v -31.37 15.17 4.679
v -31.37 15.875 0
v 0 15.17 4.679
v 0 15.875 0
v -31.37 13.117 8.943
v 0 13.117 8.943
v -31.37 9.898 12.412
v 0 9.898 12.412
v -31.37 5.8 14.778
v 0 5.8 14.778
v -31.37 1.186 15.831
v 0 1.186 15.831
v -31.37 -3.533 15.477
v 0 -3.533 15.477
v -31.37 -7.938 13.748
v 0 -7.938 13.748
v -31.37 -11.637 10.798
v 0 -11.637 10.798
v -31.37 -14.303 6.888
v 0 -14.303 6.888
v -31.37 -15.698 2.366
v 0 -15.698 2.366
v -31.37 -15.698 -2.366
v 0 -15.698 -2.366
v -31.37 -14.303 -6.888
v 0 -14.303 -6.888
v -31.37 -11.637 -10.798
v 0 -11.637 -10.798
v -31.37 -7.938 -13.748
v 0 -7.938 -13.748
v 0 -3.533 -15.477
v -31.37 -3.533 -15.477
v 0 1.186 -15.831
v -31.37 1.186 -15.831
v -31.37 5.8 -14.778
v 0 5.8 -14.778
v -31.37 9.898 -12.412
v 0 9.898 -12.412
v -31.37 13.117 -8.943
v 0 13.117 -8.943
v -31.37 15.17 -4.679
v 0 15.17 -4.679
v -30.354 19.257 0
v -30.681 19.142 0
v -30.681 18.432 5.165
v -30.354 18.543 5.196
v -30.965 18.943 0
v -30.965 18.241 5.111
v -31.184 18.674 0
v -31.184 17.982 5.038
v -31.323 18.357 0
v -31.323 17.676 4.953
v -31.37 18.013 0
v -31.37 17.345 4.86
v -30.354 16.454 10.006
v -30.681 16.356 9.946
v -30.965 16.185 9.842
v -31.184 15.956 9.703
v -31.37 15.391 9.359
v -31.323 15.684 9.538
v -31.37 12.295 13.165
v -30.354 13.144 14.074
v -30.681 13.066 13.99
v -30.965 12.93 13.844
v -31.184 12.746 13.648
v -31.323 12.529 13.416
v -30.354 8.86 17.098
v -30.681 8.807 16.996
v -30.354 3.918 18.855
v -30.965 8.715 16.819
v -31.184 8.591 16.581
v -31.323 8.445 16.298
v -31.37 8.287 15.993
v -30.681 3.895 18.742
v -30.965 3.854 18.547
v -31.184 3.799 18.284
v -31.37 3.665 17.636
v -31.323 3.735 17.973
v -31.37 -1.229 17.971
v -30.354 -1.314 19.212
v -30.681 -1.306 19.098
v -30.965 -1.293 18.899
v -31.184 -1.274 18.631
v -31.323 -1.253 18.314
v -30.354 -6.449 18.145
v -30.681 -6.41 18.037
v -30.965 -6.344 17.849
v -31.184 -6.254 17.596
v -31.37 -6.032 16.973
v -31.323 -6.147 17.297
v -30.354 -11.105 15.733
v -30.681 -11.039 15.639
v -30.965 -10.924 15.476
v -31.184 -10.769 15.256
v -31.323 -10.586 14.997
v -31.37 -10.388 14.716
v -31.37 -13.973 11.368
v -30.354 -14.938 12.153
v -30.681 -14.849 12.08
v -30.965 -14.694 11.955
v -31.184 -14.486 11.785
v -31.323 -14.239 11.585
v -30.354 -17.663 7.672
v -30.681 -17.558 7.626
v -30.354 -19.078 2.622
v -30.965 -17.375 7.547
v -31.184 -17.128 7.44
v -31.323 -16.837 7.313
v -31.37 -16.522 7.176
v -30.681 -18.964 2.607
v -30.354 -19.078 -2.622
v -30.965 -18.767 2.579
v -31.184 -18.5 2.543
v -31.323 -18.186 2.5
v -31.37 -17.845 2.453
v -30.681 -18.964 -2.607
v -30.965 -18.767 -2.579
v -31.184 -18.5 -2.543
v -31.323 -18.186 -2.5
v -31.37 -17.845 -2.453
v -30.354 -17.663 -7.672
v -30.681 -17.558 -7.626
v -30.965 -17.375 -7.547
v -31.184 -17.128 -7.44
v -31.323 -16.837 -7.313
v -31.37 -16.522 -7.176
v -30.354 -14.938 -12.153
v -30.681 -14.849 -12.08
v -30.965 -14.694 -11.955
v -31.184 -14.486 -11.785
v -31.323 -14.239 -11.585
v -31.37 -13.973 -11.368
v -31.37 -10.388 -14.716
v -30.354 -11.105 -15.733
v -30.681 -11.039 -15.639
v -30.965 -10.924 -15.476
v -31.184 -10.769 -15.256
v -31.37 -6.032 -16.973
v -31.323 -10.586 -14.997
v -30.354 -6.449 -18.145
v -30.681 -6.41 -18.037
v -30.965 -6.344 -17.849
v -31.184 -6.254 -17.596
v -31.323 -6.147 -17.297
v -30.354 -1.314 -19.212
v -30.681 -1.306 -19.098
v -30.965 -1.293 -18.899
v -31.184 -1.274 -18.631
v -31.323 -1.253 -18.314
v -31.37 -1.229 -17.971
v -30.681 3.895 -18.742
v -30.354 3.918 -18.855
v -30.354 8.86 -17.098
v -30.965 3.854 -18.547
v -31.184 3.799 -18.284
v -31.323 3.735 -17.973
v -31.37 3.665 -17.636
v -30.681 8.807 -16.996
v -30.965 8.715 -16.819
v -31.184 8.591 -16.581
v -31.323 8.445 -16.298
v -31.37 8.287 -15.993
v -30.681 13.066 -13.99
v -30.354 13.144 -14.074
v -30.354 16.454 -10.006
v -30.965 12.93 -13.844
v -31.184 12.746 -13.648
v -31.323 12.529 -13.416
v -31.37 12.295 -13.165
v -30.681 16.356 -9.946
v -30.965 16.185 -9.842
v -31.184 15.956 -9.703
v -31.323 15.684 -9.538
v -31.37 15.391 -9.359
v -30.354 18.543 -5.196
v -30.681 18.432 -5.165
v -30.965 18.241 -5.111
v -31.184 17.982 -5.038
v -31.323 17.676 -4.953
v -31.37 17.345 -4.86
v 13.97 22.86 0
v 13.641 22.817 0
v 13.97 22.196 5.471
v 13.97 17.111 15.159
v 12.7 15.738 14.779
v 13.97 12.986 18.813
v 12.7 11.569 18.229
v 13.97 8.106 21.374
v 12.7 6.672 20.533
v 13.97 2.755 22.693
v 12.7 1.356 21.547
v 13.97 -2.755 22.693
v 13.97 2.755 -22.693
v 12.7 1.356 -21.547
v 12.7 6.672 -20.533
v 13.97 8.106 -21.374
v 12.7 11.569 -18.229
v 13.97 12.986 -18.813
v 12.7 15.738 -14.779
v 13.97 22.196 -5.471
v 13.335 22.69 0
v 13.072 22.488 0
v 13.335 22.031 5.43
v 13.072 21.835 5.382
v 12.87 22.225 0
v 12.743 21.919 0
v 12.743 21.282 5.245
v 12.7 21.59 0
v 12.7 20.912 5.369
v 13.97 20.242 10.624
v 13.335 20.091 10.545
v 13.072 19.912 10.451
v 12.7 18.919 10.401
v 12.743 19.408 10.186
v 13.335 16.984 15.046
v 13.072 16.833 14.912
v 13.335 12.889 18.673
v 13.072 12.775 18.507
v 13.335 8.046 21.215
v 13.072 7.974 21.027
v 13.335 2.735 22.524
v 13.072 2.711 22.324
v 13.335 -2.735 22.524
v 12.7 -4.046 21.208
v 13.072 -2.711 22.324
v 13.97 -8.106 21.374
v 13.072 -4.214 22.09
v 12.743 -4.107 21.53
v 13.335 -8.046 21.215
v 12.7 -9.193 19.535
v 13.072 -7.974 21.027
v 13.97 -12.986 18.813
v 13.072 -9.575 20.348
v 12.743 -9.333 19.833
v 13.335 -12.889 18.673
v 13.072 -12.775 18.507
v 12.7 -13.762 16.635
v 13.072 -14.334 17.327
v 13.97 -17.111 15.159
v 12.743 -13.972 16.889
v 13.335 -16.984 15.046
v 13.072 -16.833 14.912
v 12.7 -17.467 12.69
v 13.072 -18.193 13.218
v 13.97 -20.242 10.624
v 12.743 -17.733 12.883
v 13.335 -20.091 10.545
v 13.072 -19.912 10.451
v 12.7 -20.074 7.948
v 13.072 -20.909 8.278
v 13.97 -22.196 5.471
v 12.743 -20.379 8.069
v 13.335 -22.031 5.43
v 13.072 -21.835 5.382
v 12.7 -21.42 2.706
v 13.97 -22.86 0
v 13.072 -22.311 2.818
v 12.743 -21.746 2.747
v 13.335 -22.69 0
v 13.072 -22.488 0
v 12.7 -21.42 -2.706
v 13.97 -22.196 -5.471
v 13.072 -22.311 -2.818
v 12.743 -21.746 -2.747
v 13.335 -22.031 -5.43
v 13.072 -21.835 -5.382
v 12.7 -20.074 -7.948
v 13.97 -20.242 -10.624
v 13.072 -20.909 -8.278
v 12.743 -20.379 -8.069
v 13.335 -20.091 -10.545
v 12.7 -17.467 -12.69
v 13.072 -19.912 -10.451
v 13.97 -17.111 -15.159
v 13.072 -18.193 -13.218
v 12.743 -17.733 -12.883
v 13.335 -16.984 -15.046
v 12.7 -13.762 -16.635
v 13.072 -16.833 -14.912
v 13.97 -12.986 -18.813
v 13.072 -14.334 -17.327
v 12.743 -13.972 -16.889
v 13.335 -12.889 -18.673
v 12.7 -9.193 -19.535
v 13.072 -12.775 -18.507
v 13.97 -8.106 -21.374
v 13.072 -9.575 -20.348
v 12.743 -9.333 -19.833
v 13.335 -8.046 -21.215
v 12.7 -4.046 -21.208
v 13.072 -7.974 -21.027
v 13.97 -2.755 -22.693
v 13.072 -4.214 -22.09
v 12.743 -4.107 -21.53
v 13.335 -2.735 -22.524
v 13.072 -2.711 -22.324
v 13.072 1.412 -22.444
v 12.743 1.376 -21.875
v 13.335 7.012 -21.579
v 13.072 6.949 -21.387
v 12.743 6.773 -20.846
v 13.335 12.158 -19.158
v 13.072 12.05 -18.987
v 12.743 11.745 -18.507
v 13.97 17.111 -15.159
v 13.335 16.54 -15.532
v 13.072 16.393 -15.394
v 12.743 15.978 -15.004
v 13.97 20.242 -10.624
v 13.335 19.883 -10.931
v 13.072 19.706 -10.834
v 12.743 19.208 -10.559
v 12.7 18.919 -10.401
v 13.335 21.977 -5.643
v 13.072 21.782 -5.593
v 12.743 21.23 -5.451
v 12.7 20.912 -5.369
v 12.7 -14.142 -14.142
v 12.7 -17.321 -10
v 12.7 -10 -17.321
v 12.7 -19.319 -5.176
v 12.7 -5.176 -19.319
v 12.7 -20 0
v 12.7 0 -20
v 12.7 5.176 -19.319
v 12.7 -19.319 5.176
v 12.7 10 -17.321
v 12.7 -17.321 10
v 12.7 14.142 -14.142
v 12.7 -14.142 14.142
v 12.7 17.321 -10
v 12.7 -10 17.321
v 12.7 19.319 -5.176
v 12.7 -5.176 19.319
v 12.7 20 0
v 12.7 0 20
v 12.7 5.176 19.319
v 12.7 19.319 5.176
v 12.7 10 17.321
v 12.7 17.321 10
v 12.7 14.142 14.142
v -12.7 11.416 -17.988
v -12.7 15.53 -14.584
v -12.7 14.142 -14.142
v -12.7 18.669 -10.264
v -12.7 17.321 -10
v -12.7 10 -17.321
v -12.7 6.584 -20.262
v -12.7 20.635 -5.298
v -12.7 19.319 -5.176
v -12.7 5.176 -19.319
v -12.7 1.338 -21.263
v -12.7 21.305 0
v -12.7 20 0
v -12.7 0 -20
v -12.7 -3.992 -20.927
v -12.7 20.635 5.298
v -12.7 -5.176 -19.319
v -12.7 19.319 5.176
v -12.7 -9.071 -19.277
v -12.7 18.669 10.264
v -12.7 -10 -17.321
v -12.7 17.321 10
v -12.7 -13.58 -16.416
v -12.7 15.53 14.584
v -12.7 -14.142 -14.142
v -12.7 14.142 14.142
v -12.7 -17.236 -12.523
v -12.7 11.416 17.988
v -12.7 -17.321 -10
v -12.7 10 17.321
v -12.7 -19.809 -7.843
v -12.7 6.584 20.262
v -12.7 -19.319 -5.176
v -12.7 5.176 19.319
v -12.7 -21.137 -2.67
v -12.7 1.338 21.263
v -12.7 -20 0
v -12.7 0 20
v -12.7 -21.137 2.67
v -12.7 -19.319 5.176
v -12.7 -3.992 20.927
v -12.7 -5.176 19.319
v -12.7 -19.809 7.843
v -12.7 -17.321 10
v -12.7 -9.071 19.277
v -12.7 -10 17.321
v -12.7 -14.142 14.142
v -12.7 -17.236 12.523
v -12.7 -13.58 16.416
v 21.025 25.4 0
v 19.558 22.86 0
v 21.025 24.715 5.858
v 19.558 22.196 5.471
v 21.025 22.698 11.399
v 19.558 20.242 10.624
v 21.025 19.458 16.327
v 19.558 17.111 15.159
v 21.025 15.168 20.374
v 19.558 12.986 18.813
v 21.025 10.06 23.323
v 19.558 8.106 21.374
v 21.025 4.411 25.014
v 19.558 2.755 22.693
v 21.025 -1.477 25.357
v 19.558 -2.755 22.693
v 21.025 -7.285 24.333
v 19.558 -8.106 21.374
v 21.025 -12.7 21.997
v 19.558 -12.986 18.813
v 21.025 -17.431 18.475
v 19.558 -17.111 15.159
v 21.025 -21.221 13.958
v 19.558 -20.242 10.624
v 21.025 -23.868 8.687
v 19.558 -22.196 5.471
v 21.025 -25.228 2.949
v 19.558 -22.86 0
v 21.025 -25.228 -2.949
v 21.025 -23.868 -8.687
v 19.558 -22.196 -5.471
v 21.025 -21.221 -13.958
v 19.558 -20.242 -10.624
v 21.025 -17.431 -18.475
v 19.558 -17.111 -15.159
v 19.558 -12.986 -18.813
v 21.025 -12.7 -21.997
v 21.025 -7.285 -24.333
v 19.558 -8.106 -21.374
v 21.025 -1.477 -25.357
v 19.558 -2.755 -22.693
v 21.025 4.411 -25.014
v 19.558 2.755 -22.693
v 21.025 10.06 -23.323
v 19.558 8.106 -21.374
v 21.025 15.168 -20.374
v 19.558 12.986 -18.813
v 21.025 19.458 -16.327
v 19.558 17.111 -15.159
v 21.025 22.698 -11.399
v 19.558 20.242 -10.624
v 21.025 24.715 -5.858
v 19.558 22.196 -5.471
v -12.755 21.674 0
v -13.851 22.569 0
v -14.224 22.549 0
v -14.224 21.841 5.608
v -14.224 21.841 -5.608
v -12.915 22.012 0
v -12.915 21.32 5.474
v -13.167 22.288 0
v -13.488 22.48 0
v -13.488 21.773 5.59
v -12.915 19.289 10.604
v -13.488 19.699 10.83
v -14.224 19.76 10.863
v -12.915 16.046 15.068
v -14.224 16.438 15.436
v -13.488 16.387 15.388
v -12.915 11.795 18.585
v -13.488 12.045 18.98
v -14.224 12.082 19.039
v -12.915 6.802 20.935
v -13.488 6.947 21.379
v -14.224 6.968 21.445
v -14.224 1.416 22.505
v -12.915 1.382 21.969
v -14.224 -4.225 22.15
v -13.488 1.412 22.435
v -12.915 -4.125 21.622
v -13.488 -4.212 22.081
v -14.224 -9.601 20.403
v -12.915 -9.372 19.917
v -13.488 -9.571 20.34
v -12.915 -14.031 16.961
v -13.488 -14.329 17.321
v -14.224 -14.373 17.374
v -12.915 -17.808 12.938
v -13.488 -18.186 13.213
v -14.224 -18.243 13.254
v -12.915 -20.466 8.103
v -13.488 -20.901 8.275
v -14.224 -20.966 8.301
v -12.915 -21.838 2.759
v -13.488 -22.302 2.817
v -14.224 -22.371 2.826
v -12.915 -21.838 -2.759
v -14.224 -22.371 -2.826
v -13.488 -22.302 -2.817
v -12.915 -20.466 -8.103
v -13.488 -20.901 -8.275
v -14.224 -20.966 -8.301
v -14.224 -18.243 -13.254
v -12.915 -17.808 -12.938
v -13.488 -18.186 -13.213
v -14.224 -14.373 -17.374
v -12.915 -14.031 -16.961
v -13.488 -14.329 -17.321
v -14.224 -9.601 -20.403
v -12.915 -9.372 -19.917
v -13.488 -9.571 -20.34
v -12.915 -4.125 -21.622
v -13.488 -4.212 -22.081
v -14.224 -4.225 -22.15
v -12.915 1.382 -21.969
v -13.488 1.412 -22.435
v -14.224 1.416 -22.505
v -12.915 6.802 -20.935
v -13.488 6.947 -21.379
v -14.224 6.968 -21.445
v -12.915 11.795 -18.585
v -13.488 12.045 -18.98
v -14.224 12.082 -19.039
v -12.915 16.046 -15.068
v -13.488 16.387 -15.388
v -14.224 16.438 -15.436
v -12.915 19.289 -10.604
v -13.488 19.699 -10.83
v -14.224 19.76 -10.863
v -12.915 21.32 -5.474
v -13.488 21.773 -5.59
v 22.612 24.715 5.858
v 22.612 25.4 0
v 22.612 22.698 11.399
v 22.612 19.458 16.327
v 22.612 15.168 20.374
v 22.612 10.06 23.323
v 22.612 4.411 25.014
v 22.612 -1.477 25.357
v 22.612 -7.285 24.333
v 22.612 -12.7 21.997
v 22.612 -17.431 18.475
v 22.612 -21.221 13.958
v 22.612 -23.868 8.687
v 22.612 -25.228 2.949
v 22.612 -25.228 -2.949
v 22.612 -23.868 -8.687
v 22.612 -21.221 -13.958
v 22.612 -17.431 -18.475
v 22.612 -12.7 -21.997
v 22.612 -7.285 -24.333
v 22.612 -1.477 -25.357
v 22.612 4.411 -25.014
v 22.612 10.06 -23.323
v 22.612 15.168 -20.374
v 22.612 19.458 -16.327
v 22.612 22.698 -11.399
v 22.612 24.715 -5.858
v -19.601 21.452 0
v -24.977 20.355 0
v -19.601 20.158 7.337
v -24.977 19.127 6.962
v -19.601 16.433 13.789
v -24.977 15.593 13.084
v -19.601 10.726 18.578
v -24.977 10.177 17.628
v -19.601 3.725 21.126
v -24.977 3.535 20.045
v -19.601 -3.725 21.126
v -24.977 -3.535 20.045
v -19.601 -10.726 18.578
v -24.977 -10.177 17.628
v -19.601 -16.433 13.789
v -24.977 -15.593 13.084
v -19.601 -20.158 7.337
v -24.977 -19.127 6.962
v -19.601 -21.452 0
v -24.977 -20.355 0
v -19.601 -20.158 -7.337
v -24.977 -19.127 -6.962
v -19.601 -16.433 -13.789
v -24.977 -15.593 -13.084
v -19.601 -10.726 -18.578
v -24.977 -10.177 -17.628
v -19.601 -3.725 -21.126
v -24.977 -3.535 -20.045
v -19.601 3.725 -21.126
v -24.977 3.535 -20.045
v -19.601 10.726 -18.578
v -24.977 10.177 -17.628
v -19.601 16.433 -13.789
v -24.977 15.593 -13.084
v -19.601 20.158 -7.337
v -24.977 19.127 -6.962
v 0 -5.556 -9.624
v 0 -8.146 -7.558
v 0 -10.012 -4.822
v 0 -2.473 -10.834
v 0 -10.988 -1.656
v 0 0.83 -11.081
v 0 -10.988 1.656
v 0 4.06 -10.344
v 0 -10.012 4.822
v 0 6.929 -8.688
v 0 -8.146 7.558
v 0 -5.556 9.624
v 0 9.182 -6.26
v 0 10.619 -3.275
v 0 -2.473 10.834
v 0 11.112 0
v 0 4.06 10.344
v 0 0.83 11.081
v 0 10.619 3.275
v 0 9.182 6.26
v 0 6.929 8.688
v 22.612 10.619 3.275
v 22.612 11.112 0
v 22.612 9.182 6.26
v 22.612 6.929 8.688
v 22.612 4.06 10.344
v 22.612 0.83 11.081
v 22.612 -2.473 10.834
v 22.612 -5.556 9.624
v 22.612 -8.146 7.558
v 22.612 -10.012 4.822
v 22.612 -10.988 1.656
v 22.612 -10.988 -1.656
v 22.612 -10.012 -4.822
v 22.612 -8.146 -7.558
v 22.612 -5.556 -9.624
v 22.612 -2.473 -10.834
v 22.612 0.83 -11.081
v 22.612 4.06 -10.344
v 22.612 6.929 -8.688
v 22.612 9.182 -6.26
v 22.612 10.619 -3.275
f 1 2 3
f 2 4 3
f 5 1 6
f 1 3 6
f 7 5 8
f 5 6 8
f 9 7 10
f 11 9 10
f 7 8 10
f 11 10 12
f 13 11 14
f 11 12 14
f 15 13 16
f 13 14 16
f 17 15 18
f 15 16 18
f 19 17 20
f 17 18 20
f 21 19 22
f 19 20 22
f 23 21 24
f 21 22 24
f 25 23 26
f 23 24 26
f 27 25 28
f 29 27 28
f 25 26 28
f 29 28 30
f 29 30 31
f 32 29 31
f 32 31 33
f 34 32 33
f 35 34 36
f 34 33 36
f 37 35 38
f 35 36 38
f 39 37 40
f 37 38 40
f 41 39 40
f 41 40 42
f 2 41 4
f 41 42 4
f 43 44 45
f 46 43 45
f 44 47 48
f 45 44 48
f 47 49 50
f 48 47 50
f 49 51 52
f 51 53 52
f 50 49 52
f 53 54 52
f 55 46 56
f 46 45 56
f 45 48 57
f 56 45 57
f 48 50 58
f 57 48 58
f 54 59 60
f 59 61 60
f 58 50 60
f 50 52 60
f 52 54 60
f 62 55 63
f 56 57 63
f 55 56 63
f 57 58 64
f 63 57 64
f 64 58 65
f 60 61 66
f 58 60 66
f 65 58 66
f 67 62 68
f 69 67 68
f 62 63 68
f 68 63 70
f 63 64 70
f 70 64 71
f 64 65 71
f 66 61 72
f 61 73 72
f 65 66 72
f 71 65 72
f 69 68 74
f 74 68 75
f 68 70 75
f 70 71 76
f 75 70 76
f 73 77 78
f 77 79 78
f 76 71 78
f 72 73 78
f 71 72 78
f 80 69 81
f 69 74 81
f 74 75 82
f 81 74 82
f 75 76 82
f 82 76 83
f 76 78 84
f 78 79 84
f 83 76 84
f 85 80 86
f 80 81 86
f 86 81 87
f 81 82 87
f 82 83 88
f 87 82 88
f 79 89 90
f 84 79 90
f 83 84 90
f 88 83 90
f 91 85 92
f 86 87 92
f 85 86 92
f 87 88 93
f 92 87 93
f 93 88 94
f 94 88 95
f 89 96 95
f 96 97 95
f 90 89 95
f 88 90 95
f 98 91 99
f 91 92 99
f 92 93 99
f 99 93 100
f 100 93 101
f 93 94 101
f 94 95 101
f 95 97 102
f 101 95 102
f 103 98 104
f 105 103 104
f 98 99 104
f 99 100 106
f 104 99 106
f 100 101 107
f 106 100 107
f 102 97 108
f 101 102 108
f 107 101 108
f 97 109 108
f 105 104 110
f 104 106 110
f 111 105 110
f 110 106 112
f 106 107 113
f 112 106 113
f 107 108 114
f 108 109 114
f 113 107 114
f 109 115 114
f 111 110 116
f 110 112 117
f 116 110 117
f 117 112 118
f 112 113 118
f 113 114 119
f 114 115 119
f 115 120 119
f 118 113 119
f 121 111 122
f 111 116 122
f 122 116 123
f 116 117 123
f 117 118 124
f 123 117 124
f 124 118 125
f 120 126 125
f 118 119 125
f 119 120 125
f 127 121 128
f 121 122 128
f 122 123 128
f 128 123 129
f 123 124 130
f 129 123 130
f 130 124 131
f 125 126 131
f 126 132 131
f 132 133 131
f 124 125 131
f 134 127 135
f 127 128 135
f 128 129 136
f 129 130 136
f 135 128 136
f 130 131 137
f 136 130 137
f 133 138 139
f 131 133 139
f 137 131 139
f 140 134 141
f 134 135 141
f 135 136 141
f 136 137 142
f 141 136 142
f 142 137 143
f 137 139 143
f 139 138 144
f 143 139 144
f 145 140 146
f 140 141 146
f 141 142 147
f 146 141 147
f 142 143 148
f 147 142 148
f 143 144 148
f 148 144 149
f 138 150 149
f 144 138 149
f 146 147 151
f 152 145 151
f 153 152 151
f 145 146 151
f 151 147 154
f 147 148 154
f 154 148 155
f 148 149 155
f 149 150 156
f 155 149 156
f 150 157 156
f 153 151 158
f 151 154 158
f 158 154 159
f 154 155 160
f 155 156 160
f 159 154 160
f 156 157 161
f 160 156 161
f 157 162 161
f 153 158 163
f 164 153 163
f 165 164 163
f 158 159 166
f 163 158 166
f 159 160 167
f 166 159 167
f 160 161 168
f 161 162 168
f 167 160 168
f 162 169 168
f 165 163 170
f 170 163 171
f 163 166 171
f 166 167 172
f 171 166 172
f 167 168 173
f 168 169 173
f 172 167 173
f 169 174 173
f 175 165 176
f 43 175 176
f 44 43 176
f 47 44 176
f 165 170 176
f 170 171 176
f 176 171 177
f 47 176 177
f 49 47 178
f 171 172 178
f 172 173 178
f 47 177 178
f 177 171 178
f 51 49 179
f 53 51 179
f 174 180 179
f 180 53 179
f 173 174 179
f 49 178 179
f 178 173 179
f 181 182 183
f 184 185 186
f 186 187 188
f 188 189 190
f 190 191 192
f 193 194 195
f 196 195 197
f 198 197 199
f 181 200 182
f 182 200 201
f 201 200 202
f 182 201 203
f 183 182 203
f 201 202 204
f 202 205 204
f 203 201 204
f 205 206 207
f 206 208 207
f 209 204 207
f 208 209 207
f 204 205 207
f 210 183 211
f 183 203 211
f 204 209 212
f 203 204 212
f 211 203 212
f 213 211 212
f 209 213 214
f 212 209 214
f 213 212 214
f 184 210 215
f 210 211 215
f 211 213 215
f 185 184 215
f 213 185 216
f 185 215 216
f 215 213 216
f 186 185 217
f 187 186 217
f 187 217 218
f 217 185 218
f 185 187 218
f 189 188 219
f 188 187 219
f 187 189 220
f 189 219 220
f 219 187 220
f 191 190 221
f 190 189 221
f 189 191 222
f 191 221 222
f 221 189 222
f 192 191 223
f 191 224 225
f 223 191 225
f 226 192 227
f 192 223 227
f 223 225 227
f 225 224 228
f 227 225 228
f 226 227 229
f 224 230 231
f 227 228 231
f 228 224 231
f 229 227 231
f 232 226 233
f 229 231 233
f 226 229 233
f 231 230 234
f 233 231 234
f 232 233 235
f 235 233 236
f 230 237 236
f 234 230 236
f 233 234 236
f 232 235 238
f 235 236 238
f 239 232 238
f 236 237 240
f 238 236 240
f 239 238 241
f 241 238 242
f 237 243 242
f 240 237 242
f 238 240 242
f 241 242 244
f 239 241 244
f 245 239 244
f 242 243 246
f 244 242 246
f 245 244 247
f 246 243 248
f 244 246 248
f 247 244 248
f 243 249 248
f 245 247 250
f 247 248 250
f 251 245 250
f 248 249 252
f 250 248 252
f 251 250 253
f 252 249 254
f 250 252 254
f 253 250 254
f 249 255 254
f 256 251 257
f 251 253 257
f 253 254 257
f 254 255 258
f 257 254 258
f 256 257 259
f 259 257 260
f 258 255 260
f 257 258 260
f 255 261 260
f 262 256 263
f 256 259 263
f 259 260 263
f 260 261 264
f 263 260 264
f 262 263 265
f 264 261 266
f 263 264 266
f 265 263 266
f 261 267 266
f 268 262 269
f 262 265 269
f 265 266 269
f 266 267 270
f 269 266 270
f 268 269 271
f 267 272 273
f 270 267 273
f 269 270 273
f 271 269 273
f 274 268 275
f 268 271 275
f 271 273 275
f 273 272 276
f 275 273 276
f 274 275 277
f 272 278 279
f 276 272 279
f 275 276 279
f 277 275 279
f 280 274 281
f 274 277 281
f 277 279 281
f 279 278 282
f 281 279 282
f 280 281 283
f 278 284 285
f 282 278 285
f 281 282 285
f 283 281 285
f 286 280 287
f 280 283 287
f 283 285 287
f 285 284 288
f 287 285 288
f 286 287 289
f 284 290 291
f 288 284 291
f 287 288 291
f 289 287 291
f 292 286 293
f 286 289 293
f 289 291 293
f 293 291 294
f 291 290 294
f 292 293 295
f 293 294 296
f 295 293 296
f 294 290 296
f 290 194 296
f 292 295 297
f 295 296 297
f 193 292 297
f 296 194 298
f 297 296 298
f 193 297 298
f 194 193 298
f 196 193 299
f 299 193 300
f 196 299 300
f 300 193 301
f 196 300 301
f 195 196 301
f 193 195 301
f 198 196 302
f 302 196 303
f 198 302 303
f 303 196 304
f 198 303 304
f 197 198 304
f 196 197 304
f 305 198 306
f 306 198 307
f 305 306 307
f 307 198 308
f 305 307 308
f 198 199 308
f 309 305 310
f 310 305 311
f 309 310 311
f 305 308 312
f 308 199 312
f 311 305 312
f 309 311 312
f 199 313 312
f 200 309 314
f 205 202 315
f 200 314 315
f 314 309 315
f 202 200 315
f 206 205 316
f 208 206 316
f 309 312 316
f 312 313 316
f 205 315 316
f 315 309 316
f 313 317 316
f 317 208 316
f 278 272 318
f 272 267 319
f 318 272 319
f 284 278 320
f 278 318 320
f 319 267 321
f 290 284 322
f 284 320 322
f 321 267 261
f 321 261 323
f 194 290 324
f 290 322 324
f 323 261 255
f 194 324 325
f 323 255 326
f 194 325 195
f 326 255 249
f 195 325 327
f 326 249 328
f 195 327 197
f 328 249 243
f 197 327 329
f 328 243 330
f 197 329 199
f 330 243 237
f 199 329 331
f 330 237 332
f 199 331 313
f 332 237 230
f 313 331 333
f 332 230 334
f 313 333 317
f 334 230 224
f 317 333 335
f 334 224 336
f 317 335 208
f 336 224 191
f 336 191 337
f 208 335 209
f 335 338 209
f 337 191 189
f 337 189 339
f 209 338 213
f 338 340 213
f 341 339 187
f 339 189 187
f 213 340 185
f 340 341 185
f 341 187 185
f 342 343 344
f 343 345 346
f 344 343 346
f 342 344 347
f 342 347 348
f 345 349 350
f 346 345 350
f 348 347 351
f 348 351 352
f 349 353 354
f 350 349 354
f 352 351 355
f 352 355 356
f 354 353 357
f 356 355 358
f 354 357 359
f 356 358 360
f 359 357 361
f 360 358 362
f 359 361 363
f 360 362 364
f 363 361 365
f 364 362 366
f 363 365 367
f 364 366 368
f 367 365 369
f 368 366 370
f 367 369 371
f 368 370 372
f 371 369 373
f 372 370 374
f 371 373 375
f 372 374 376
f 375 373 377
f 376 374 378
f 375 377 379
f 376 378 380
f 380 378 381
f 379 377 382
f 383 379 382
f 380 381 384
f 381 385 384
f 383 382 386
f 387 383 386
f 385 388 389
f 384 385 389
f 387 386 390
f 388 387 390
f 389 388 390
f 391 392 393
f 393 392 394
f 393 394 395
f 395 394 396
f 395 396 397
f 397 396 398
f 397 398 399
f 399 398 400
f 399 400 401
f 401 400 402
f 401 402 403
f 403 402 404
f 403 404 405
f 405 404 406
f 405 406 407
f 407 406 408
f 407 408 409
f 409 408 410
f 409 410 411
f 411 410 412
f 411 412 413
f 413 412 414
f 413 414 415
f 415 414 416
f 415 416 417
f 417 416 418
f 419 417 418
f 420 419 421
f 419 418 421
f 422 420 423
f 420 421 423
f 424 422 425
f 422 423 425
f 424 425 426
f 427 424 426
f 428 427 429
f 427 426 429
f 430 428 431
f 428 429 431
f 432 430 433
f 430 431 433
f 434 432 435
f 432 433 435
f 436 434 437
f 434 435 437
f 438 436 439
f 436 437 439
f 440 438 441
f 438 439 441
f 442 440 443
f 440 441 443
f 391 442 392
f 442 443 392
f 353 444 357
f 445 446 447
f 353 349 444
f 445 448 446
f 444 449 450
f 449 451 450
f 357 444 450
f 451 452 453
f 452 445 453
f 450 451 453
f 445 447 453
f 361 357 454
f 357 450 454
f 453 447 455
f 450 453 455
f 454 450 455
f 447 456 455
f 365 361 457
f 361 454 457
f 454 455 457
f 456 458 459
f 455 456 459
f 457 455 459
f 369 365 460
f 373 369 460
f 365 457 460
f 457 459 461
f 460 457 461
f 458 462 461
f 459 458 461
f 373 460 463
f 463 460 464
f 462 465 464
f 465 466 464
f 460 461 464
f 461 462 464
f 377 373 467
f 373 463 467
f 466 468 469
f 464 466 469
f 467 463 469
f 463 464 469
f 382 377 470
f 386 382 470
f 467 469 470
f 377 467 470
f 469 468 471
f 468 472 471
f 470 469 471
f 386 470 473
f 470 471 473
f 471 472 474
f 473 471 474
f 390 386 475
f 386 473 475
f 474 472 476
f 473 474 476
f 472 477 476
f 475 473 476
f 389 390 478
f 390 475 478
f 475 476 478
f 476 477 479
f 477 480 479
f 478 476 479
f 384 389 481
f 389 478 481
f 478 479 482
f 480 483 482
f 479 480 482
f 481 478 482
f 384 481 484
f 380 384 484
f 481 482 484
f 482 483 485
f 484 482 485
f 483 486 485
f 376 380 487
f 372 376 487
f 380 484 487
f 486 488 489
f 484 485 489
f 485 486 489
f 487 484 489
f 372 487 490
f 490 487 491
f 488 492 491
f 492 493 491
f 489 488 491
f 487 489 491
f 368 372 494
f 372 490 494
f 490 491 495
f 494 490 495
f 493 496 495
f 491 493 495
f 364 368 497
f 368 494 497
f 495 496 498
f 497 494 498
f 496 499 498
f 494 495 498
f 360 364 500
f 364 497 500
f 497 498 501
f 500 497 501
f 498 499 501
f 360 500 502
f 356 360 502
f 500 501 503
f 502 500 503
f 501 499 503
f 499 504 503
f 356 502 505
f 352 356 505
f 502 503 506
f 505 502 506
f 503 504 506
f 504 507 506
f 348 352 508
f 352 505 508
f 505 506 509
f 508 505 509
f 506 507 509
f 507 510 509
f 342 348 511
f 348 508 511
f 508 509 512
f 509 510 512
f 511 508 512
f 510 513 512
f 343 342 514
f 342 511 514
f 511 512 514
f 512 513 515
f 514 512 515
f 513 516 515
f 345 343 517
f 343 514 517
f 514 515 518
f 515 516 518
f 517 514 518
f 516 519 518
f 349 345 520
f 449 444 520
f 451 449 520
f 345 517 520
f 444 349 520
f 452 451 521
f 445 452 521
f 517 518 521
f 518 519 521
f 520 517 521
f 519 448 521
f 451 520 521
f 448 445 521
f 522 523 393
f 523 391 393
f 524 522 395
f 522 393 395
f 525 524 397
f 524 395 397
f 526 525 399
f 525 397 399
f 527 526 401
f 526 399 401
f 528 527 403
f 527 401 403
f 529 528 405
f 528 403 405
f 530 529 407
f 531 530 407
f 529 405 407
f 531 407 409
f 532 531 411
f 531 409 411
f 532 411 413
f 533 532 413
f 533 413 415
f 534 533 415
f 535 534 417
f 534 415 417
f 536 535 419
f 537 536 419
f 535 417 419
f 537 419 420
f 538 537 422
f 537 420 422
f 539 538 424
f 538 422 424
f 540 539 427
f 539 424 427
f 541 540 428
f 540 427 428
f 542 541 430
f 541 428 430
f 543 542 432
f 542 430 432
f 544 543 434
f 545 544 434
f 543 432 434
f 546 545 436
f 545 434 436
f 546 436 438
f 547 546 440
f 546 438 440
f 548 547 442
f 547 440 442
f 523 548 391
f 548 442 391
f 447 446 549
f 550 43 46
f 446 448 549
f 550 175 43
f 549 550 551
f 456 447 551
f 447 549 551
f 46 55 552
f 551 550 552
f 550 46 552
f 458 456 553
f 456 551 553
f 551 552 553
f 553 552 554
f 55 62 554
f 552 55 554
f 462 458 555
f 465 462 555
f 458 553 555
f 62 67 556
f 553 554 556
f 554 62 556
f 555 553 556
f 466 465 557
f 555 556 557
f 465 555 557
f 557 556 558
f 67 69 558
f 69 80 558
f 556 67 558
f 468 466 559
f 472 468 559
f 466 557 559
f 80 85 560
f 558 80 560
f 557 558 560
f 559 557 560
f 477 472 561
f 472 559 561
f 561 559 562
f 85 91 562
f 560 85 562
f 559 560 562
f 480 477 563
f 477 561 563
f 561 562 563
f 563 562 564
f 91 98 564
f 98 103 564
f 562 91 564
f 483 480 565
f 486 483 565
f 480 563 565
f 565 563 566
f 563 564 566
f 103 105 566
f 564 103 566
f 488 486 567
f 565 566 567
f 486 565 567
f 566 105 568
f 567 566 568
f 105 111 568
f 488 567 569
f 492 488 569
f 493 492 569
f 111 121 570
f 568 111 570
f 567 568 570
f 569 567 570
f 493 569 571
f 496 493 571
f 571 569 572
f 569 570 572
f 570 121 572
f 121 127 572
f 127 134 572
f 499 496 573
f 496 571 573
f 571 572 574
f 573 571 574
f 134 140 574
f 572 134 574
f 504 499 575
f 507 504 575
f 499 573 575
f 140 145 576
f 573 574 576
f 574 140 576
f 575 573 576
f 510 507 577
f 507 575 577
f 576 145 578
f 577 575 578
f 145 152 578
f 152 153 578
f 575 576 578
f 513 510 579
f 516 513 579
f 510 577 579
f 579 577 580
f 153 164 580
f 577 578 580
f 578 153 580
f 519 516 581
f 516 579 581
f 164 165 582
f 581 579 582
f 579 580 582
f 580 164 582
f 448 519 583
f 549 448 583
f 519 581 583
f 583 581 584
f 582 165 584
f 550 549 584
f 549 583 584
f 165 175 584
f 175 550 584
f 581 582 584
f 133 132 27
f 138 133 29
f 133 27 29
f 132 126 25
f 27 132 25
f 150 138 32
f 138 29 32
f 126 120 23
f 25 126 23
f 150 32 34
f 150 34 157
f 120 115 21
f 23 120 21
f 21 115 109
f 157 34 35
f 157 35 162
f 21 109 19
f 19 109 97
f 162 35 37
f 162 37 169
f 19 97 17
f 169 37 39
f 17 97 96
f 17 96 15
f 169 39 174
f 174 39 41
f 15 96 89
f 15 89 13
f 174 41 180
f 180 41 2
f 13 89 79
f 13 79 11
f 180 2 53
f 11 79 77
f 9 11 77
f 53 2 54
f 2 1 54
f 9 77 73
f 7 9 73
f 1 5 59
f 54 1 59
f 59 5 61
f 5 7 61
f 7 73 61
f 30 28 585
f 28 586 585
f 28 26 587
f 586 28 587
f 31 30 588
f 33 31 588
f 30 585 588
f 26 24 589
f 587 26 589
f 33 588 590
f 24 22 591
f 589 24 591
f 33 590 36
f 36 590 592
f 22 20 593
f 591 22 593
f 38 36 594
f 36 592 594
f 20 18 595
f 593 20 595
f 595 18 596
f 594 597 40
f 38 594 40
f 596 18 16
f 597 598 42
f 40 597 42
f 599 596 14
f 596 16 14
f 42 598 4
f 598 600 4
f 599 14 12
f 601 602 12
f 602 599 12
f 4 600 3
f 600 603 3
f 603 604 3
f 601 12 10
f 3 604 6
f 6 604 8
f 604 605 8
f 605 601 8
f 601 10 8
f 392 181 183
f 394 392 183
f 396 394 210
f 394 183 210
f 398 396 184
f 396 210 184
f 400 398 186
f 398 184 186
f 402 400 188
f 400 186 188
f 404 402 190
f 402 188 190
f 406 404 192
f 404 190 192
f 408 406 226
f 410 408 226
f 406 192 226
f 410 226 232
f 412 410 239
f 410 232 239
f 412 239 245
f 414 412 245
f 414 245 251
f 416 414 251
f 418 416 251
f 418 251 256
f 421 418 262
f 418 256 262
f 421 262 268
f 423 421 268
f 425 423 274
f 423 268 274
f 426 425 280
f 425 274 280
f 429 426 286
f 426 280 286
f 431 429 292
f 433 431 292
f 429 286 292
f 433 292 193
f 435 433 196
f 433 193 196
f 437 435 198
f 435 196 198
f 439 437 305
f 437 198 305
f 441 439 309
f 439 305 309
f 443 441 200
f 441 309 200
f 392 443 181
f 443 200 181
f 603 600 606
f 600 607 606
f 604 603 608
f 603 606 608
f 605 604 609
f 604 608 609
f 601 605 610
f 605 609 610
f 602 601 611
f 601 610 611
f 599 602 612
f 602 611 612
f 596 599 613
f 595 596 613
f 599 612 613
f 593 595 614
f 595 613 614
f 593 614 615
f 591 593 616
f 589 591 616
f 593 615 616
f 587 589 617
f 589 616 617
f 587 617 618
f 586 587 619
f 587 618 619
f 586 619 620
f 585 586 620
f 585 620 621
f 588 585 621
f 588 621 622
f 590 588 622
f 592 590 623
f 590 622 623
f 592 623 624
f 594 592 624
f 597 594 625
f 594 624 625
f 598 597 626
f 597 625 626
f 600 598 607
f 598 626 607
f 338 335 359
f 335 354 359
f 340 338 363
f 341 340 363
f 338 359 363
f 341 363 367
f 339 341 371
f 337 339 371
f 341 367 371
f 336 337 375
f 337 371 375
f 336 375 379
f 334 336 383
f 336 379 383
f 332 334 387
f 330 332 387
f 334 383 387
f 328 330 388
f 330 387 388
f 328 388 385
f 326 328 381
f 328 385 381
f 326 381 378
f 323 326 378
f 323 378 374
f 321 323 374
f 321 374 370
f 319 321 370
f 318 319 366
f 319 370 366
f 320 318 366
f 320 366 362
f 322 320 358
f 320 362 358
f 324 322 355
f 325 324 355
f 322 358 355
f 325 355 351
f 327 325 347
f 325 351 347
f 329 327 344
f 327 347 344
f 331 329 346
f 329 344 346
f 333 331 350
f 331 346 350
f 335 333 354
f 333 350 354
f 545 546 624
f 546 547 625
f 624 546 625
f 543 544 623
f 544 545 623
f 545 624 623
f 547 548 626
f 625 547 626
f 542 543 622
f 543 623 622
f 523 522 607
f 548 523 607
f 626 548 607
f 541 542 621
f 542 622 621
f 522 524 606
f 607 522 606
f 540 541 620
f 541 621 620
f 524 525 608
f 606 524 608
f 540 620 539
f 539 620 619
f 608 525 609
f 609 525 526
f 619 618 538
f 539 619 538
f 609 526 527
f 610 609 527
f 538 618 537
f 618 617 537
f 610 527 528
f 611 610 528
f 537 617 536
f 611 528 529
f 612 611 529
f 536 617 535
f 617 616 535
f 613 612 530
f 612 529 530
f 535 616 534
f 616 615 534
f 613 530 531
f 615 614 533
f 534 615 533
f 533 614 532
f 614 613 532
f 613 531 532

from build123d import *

# Parameters (mm, degrees)
FILLET1_R = 1.27


with BuildPart() as part:
    # Sketch1 → Revolve1 (revolve)
    with BuildSketch(Plane.XY):
        Polygon((0, 11.1125), (22.612386478, 11.1125), (22.612386478, 25.4), (21.024886478, 25.4), (19.558416794, 22.86), (12.7, 22.86), (12.7, 20), (-12.7, 20), (-12.7, 22.86), (-31.370233522, 19.05), (-31.370233522, 15.875), (0, 15.875), align=None)
    revolve(axis=Axis((-42.201018363, 0, 0), (1, 0, 0)))

    # Fillet1
    fillet1_edges = [part.edges().sort_by_distance(p)[0] for p in [
        (12.7, -22.86, 0),
        (-31.370233522, -19.05, 0),
        (-12.7, -22.86, 0),
    ]]
    fillet(fillet1_edges, radius=FILLET1_R)


solid = part.part
